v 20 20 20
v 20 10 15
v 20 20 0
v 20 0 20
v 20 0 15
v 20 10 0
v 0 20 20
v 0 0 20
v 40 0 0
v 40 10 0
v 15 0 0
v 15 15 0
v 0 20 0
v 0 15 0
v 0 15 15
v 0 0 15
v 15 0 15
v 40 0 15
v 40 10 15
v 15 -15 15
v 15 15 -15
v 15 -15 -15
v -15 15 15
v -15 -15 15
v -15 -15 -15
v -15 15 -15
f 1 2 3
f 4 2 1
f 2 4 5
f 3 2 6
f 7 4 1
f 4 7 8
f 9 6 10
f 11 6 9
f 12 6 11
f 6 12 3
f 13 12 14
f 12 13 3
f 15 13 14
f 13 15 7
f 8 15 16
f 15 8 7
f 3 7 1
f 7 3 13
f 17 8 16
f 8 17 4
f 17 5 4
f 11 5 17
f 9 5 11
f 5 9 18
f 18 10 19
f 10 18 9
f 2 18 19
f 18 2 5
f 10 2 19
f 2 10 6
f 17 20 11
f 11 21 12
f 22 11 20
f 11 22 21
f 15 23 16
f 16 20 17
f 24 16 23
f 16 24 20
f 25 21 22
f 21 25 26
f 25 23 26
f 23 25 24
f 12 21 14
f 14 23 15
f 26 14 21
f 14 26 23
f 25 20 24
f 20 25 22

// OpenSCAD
// test.scad - Sample file for CadCam v0.1
// Only cube() is supported in this version.

cube(20);
cube([40, 10, 15]);
cube([30, 30, 30], center=true);
